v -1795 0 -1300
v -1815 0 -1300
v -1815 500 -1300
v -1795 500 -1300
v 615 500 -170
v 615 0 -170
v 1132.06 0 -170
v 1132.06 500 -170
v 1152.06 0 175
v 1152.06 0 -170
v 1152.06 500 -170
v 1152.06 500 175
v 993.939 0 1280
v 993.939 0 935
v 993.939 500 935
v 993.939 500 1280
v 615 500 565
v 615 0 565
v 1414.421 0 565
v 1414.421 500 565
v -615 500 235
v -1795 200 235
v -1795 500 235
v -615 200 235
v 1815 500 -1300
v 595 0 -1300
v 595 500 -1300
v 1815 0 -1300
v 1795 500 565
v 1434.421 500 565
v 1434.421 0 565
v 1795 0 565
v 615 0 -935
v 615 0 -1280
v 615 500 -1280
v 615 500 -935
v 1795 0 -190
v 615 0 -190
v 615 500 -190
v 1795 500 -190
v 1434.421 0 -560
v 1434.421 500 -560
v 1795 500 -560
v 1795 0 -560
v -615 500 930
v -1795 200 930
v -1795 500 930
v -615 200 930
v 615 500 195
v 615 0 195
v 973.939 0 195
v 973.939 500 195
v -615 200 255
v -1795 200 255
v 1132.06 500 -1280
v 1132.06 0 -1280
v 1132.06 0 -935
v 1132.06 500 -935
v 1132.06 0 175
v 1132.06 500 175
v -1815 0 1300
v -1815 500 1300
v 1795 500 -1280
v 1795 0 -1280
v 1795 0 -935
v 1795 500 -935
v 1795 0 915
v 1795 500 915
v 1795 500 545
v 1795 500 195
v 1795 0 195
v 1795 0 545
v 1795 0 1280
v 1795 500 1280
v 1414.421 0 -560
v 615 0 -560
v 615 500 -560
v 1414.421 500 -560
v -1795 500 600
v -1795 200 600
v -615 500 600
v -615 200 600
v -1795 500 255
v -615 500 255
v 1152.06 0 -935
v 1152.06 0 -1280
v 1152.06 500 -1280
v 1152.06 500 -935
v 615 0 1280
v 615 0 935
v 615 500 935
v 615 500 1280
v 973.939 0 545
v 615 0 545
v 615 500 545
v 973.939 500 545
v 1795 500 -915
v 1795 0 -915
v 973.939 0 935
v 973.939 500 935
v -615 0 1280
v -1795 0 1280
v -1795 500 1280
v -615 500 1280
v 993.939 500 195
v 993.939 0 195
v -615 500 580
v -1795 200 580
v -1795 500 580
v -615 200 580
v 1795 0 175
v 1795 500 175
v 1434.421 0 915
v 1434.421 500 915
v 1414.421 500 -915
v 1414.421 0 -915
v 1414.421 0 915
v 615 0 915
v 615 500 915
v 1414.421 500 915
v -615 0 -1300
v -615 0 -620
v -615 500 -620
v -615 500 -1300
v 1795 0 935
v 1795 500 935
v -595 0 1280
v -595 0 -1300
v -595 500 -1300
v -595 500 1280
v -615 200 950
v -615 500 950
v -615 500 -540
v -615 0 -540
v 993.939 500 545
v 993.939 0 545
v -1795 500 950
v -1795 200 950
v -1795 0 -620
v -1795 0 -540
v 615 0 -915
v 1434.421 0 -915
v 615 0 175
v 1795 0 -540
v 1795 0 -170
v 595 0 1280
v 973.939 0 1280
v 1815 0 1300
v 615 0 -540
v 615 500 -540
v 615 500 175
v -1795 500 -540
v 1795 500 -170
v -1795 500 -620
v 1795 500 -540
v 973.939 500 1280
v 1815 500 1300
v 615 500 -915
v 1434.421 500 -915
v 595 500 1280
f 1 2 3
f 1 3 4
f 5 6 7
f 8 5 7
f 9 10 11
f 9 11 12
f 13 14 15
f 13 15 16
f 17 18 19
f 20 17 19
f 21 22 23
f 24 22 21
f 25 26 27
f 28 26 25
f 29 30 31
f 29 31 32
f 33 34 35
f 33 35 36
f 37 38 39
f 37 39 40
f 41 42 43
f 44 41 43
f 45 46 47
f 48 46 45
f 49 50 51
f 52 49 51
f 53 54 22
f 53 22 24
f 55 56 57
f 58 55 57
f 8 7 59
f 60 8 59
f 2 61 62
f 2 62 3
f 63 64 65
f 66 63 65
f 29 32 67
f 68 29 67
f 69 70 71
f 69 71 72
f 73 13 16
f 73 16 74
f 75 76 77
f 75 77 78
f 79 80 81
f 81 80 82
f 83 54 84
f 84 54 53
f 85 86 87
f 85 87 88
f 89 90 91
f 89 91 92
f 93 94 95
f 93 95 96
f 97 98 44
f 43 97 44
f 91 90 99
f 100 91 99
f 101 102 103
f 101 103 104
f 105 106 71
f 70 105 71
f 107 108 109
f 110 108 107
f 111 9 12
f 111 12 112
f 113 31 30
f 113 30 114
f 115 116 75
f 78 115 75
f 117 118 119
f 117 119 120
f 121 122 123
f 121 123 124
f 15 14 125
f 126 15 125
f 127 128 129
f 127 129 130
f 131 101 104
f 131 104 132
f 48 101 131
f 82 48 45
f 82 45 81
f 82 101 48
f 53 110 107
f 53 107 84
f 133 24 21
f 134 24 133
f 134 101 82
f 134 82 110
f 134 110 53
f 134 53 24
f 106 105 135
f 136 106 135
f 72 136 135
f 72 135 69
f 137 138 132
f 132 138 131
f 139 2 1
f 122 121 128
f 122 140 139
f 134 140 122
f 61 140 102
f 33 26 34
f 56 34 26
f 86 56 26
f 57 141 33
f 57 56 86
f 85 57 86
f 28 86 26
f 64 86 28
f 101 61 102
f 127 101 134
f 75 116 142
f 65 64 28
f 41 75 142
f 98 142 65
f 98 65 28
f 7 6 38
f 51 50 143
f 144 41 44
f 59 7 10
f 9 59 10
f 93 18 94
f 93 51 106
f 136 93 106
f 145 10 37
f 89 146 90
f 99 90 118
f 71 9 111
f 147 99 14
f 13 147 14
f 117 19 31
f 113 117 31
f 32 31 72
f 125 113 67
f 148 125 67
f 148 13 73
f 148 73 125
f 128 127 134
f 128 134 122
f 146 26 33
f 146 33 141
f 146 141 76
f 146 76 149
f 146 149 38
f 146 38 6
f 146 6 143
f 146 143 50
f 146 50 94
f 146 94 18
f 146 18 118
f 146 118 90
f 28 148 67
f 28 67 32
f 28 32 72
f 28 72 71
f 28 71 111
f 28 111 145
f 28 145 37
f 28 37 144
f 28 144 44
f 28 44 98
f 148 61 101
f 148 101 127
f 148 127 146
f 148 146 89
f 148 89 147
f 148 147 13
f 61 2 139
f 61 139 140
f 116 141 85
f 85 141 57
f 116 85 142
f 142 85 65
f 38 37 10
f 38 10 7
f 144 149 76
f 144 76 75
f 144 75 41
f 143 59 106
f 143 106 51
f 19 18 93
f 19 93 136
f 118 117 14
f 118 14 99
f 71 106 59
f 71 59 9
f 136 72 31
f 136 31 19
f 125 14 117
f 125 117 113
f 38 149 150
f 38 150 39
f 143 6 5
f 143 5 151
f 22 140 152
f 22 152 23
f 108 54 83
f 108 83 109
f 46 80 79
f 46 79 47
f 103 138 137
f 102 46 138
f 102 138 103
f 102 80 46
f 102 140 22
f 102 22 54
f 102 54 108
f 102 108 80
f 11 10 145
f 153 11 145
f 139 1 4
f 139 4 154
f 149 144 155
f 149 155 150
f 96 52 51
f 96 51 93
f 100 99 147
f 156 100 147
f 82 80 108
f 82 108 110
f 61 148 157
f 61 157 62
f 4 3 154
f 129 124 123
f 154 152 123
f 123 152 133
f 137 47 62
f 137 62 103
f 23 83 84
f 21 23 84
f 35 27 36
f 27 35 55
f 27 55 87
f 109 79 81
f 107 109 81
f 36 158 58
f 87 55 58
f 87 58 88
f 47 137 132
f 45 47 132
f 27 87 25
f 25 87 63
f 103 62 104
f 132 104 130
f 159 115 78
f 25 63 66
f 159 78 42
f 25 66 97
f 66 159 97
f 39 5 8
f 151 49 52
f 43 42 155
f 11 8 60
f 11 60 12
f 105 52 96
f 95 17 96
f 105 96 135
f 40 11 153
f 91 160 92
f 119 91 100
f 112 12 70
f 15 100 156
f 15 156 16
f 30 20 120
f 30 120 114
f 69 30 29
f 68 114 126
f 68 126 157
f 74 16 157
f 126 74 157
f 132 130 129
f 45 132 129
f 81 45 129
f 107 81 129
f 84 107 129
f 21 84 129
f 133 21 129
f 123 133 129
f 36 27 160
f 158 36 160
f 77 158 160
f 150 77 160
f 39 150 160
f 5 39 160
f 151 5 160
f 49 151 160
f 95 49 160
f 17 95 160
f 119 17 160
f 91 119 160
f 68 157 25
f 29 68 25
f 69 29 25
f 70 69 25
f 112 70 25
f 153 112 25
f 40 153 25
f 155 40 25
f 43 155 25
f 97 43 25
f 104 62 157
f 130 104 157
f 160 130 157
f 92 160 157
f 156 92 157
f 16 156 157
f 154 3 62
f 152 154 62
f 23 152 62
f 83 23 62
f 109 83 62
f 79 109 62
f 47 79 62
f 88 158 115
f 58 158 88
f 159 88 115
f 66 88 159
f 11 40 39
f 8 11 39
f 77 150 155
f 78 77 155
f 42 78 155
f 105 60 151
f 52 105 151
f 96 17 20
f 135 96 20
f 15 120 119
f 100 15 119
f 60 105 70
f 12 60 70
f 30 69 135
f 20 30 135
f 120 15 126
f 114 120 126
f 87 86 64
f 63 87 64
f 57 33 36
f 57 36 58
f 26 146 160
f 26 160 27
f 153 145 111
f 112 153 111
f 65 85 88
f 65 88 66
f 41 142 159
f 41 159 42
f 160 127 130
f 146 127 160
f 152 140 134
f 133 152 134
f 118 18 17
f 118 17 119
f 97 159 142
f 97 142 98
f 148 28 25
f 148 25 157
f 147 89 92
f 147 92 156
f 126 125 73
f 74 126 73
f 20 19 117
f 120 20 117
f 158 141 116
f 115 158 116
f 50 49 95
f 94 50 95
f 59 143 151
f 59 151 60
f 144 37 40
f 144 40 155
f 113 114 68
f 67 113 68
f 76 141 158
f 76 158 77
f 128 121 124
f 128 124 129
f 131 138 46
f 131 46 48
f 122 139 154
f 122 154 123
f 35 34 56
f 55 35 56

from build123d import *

# Parameters (mm, degrees)
F0_W     = 517.0604085922
F0_H     = 344.9999976158
F0_W_2   = 642.9395914078
F0_W_3   = 799.4206047058
F0_H_2   = 355.0000023842
F0_W_4   = 360.5793952942
F0_H_3   = 344.9999970198
F0_W_5   = 358.938703537
F0_H_4   = 350.0000196695
F0_W_6   = 801.061296463
F0_H_5   = 344.9999785423
F0_H_6   = 350.0000047684
F1_DEPTH = 500
F0_W_7   = 1180
F0_H_7   = 40
F2_DEPTH = 500
F3_DEPTH = 500
F4_START = -200
F0_H_8   = 20
F4_DEPTH = 300


with BuildPart() as f1:
    # F0 (on Front) → F1 (new body)
    with BuildSketch(Plane.XZ):
        Polygon((1414.4206047058, -1300), (1815, -1300), (1815, 1300), (605, 1300), (-605, 1300), (-1815, 1300), (-1815, -1300), (-1795, -1300), (-1795, -620), (-1795, -580), (-1795, -540), (-1795, 235), (-1795, 255), (-1795, 580), (-1795, 600), (-1795, 930), (-1795, 950), (-1795, 1280), (-615, 1280), (-615, 950), (-615, 930), (-615, 600), (-615, 580), (-615, 255), (-615, 235), (-615, -540), (-615, -580), (-615, -620), (-615, -1300), (-605, -1300), (-595, -1300), (-595, 900), (-595, 1280), (595, 1280), (595, 900), (595, -1300), (605, -1300), (665, -1300), align=None)
        with Locations((873.5302042961, -1107.5000011921)):
            Rectangle(F0_W, F0_H, mode=Mode.SUBTRACT)
        with Locations((1473.5302042961, -1107.5000011921)):
            Rectangle(F0_W_2, F0_H, mode=Mode.SUBTRACT)
        with Locations((1014.7103023529, -737.5000011921)):
            Rectangle(F0_W_3, F0_H_2, mode=Mode.SUBTRACT)
        with Locations((1614.7103023529, -737.5000011921)):
            Rectangle(F0_W_4, F0_H_2, mode=Mode.SUBTRACT)
        Polygon((615, -190), (1795, -190), (1795, -540), (1434.4206047058, -540), (1414.4206047058, -540), (615, -540), align=None, mode=Mode.SUBTRACT)
        with Locations((873.5302042961, 2.4999985099)):
            Rectangle(F0_W, F0_H_3, mode=Mode.SUBTRACT)
        with Locations((794.4693517685, 370.0000068545)):
            Rectangle(F0_W_5, F0_H_4, mode=Mode.SUBTRACT)
        with Locations((1473.5302042961, 2.4999985099)):
            Rectangle(F0_W_2, F0_H_3, mode=Mode.SUBTRACT)
        with Locations((1394.4693517685, 370.0000068545)):
            Rectangle(F0_W_6, F0_H_4, mode=Mode.SUBTRACT)
        with Locations((794.4693517685, 1107.5000107288)):
            Rectangle(F0_W_5, F0_H_5, mode=Mode.SUBTRACT)
        with Locations((1014.7103023529, 740.0000190735)):
            Rectangle(F0_W_3, F0_H_6, mode=Mode.SUBTRACT)
        with Locations((1614.7103023529, 740.0000190735)):
            Rectangle(F0_W_4, F0_H_6, mode=Mode.SUBTRACT)
        with Locations((1394.4693517685, 1107.5000107288)):
            Rectangle(F0_W_6, F0_H_5, mode=Mode.SUBTRACT)
    extrude(amount=-F1_DEPTH)

    # F0 (on Front) → F2 (join)
    with BuildSketch(Plane.XZ):
        with Locations((-1205, -560)):
            Rectangle(F0_W_7, F0_H_7)
    extrude(amount=-F2_DEPTH)

    # F0 (on Front) → F3 (join)
    with BuildSketch(Plane.XZ):
        with Locations((-1205, -600)):
            Rectangle(F0_W_7, F0_H_7)
    extrude(amount=-F3_DEPTH)

    # F0 (on Front) → F4 (join)
    with BuildSketch(Plane.XZ.offset(F4_START)):
        with Locations((-1205, 245)):
            Rectangle(F0_W_7, F0_H_8)
        with Locations((-1205, 590)):
            Rectangle(F0_W_7, F0_H_8)
        with Locations((-1205, 940)):
            Rectangle(F0_W_7, F0_H_8)
    extrude(amount=-F4_DEPTH)


solid = f1.part
